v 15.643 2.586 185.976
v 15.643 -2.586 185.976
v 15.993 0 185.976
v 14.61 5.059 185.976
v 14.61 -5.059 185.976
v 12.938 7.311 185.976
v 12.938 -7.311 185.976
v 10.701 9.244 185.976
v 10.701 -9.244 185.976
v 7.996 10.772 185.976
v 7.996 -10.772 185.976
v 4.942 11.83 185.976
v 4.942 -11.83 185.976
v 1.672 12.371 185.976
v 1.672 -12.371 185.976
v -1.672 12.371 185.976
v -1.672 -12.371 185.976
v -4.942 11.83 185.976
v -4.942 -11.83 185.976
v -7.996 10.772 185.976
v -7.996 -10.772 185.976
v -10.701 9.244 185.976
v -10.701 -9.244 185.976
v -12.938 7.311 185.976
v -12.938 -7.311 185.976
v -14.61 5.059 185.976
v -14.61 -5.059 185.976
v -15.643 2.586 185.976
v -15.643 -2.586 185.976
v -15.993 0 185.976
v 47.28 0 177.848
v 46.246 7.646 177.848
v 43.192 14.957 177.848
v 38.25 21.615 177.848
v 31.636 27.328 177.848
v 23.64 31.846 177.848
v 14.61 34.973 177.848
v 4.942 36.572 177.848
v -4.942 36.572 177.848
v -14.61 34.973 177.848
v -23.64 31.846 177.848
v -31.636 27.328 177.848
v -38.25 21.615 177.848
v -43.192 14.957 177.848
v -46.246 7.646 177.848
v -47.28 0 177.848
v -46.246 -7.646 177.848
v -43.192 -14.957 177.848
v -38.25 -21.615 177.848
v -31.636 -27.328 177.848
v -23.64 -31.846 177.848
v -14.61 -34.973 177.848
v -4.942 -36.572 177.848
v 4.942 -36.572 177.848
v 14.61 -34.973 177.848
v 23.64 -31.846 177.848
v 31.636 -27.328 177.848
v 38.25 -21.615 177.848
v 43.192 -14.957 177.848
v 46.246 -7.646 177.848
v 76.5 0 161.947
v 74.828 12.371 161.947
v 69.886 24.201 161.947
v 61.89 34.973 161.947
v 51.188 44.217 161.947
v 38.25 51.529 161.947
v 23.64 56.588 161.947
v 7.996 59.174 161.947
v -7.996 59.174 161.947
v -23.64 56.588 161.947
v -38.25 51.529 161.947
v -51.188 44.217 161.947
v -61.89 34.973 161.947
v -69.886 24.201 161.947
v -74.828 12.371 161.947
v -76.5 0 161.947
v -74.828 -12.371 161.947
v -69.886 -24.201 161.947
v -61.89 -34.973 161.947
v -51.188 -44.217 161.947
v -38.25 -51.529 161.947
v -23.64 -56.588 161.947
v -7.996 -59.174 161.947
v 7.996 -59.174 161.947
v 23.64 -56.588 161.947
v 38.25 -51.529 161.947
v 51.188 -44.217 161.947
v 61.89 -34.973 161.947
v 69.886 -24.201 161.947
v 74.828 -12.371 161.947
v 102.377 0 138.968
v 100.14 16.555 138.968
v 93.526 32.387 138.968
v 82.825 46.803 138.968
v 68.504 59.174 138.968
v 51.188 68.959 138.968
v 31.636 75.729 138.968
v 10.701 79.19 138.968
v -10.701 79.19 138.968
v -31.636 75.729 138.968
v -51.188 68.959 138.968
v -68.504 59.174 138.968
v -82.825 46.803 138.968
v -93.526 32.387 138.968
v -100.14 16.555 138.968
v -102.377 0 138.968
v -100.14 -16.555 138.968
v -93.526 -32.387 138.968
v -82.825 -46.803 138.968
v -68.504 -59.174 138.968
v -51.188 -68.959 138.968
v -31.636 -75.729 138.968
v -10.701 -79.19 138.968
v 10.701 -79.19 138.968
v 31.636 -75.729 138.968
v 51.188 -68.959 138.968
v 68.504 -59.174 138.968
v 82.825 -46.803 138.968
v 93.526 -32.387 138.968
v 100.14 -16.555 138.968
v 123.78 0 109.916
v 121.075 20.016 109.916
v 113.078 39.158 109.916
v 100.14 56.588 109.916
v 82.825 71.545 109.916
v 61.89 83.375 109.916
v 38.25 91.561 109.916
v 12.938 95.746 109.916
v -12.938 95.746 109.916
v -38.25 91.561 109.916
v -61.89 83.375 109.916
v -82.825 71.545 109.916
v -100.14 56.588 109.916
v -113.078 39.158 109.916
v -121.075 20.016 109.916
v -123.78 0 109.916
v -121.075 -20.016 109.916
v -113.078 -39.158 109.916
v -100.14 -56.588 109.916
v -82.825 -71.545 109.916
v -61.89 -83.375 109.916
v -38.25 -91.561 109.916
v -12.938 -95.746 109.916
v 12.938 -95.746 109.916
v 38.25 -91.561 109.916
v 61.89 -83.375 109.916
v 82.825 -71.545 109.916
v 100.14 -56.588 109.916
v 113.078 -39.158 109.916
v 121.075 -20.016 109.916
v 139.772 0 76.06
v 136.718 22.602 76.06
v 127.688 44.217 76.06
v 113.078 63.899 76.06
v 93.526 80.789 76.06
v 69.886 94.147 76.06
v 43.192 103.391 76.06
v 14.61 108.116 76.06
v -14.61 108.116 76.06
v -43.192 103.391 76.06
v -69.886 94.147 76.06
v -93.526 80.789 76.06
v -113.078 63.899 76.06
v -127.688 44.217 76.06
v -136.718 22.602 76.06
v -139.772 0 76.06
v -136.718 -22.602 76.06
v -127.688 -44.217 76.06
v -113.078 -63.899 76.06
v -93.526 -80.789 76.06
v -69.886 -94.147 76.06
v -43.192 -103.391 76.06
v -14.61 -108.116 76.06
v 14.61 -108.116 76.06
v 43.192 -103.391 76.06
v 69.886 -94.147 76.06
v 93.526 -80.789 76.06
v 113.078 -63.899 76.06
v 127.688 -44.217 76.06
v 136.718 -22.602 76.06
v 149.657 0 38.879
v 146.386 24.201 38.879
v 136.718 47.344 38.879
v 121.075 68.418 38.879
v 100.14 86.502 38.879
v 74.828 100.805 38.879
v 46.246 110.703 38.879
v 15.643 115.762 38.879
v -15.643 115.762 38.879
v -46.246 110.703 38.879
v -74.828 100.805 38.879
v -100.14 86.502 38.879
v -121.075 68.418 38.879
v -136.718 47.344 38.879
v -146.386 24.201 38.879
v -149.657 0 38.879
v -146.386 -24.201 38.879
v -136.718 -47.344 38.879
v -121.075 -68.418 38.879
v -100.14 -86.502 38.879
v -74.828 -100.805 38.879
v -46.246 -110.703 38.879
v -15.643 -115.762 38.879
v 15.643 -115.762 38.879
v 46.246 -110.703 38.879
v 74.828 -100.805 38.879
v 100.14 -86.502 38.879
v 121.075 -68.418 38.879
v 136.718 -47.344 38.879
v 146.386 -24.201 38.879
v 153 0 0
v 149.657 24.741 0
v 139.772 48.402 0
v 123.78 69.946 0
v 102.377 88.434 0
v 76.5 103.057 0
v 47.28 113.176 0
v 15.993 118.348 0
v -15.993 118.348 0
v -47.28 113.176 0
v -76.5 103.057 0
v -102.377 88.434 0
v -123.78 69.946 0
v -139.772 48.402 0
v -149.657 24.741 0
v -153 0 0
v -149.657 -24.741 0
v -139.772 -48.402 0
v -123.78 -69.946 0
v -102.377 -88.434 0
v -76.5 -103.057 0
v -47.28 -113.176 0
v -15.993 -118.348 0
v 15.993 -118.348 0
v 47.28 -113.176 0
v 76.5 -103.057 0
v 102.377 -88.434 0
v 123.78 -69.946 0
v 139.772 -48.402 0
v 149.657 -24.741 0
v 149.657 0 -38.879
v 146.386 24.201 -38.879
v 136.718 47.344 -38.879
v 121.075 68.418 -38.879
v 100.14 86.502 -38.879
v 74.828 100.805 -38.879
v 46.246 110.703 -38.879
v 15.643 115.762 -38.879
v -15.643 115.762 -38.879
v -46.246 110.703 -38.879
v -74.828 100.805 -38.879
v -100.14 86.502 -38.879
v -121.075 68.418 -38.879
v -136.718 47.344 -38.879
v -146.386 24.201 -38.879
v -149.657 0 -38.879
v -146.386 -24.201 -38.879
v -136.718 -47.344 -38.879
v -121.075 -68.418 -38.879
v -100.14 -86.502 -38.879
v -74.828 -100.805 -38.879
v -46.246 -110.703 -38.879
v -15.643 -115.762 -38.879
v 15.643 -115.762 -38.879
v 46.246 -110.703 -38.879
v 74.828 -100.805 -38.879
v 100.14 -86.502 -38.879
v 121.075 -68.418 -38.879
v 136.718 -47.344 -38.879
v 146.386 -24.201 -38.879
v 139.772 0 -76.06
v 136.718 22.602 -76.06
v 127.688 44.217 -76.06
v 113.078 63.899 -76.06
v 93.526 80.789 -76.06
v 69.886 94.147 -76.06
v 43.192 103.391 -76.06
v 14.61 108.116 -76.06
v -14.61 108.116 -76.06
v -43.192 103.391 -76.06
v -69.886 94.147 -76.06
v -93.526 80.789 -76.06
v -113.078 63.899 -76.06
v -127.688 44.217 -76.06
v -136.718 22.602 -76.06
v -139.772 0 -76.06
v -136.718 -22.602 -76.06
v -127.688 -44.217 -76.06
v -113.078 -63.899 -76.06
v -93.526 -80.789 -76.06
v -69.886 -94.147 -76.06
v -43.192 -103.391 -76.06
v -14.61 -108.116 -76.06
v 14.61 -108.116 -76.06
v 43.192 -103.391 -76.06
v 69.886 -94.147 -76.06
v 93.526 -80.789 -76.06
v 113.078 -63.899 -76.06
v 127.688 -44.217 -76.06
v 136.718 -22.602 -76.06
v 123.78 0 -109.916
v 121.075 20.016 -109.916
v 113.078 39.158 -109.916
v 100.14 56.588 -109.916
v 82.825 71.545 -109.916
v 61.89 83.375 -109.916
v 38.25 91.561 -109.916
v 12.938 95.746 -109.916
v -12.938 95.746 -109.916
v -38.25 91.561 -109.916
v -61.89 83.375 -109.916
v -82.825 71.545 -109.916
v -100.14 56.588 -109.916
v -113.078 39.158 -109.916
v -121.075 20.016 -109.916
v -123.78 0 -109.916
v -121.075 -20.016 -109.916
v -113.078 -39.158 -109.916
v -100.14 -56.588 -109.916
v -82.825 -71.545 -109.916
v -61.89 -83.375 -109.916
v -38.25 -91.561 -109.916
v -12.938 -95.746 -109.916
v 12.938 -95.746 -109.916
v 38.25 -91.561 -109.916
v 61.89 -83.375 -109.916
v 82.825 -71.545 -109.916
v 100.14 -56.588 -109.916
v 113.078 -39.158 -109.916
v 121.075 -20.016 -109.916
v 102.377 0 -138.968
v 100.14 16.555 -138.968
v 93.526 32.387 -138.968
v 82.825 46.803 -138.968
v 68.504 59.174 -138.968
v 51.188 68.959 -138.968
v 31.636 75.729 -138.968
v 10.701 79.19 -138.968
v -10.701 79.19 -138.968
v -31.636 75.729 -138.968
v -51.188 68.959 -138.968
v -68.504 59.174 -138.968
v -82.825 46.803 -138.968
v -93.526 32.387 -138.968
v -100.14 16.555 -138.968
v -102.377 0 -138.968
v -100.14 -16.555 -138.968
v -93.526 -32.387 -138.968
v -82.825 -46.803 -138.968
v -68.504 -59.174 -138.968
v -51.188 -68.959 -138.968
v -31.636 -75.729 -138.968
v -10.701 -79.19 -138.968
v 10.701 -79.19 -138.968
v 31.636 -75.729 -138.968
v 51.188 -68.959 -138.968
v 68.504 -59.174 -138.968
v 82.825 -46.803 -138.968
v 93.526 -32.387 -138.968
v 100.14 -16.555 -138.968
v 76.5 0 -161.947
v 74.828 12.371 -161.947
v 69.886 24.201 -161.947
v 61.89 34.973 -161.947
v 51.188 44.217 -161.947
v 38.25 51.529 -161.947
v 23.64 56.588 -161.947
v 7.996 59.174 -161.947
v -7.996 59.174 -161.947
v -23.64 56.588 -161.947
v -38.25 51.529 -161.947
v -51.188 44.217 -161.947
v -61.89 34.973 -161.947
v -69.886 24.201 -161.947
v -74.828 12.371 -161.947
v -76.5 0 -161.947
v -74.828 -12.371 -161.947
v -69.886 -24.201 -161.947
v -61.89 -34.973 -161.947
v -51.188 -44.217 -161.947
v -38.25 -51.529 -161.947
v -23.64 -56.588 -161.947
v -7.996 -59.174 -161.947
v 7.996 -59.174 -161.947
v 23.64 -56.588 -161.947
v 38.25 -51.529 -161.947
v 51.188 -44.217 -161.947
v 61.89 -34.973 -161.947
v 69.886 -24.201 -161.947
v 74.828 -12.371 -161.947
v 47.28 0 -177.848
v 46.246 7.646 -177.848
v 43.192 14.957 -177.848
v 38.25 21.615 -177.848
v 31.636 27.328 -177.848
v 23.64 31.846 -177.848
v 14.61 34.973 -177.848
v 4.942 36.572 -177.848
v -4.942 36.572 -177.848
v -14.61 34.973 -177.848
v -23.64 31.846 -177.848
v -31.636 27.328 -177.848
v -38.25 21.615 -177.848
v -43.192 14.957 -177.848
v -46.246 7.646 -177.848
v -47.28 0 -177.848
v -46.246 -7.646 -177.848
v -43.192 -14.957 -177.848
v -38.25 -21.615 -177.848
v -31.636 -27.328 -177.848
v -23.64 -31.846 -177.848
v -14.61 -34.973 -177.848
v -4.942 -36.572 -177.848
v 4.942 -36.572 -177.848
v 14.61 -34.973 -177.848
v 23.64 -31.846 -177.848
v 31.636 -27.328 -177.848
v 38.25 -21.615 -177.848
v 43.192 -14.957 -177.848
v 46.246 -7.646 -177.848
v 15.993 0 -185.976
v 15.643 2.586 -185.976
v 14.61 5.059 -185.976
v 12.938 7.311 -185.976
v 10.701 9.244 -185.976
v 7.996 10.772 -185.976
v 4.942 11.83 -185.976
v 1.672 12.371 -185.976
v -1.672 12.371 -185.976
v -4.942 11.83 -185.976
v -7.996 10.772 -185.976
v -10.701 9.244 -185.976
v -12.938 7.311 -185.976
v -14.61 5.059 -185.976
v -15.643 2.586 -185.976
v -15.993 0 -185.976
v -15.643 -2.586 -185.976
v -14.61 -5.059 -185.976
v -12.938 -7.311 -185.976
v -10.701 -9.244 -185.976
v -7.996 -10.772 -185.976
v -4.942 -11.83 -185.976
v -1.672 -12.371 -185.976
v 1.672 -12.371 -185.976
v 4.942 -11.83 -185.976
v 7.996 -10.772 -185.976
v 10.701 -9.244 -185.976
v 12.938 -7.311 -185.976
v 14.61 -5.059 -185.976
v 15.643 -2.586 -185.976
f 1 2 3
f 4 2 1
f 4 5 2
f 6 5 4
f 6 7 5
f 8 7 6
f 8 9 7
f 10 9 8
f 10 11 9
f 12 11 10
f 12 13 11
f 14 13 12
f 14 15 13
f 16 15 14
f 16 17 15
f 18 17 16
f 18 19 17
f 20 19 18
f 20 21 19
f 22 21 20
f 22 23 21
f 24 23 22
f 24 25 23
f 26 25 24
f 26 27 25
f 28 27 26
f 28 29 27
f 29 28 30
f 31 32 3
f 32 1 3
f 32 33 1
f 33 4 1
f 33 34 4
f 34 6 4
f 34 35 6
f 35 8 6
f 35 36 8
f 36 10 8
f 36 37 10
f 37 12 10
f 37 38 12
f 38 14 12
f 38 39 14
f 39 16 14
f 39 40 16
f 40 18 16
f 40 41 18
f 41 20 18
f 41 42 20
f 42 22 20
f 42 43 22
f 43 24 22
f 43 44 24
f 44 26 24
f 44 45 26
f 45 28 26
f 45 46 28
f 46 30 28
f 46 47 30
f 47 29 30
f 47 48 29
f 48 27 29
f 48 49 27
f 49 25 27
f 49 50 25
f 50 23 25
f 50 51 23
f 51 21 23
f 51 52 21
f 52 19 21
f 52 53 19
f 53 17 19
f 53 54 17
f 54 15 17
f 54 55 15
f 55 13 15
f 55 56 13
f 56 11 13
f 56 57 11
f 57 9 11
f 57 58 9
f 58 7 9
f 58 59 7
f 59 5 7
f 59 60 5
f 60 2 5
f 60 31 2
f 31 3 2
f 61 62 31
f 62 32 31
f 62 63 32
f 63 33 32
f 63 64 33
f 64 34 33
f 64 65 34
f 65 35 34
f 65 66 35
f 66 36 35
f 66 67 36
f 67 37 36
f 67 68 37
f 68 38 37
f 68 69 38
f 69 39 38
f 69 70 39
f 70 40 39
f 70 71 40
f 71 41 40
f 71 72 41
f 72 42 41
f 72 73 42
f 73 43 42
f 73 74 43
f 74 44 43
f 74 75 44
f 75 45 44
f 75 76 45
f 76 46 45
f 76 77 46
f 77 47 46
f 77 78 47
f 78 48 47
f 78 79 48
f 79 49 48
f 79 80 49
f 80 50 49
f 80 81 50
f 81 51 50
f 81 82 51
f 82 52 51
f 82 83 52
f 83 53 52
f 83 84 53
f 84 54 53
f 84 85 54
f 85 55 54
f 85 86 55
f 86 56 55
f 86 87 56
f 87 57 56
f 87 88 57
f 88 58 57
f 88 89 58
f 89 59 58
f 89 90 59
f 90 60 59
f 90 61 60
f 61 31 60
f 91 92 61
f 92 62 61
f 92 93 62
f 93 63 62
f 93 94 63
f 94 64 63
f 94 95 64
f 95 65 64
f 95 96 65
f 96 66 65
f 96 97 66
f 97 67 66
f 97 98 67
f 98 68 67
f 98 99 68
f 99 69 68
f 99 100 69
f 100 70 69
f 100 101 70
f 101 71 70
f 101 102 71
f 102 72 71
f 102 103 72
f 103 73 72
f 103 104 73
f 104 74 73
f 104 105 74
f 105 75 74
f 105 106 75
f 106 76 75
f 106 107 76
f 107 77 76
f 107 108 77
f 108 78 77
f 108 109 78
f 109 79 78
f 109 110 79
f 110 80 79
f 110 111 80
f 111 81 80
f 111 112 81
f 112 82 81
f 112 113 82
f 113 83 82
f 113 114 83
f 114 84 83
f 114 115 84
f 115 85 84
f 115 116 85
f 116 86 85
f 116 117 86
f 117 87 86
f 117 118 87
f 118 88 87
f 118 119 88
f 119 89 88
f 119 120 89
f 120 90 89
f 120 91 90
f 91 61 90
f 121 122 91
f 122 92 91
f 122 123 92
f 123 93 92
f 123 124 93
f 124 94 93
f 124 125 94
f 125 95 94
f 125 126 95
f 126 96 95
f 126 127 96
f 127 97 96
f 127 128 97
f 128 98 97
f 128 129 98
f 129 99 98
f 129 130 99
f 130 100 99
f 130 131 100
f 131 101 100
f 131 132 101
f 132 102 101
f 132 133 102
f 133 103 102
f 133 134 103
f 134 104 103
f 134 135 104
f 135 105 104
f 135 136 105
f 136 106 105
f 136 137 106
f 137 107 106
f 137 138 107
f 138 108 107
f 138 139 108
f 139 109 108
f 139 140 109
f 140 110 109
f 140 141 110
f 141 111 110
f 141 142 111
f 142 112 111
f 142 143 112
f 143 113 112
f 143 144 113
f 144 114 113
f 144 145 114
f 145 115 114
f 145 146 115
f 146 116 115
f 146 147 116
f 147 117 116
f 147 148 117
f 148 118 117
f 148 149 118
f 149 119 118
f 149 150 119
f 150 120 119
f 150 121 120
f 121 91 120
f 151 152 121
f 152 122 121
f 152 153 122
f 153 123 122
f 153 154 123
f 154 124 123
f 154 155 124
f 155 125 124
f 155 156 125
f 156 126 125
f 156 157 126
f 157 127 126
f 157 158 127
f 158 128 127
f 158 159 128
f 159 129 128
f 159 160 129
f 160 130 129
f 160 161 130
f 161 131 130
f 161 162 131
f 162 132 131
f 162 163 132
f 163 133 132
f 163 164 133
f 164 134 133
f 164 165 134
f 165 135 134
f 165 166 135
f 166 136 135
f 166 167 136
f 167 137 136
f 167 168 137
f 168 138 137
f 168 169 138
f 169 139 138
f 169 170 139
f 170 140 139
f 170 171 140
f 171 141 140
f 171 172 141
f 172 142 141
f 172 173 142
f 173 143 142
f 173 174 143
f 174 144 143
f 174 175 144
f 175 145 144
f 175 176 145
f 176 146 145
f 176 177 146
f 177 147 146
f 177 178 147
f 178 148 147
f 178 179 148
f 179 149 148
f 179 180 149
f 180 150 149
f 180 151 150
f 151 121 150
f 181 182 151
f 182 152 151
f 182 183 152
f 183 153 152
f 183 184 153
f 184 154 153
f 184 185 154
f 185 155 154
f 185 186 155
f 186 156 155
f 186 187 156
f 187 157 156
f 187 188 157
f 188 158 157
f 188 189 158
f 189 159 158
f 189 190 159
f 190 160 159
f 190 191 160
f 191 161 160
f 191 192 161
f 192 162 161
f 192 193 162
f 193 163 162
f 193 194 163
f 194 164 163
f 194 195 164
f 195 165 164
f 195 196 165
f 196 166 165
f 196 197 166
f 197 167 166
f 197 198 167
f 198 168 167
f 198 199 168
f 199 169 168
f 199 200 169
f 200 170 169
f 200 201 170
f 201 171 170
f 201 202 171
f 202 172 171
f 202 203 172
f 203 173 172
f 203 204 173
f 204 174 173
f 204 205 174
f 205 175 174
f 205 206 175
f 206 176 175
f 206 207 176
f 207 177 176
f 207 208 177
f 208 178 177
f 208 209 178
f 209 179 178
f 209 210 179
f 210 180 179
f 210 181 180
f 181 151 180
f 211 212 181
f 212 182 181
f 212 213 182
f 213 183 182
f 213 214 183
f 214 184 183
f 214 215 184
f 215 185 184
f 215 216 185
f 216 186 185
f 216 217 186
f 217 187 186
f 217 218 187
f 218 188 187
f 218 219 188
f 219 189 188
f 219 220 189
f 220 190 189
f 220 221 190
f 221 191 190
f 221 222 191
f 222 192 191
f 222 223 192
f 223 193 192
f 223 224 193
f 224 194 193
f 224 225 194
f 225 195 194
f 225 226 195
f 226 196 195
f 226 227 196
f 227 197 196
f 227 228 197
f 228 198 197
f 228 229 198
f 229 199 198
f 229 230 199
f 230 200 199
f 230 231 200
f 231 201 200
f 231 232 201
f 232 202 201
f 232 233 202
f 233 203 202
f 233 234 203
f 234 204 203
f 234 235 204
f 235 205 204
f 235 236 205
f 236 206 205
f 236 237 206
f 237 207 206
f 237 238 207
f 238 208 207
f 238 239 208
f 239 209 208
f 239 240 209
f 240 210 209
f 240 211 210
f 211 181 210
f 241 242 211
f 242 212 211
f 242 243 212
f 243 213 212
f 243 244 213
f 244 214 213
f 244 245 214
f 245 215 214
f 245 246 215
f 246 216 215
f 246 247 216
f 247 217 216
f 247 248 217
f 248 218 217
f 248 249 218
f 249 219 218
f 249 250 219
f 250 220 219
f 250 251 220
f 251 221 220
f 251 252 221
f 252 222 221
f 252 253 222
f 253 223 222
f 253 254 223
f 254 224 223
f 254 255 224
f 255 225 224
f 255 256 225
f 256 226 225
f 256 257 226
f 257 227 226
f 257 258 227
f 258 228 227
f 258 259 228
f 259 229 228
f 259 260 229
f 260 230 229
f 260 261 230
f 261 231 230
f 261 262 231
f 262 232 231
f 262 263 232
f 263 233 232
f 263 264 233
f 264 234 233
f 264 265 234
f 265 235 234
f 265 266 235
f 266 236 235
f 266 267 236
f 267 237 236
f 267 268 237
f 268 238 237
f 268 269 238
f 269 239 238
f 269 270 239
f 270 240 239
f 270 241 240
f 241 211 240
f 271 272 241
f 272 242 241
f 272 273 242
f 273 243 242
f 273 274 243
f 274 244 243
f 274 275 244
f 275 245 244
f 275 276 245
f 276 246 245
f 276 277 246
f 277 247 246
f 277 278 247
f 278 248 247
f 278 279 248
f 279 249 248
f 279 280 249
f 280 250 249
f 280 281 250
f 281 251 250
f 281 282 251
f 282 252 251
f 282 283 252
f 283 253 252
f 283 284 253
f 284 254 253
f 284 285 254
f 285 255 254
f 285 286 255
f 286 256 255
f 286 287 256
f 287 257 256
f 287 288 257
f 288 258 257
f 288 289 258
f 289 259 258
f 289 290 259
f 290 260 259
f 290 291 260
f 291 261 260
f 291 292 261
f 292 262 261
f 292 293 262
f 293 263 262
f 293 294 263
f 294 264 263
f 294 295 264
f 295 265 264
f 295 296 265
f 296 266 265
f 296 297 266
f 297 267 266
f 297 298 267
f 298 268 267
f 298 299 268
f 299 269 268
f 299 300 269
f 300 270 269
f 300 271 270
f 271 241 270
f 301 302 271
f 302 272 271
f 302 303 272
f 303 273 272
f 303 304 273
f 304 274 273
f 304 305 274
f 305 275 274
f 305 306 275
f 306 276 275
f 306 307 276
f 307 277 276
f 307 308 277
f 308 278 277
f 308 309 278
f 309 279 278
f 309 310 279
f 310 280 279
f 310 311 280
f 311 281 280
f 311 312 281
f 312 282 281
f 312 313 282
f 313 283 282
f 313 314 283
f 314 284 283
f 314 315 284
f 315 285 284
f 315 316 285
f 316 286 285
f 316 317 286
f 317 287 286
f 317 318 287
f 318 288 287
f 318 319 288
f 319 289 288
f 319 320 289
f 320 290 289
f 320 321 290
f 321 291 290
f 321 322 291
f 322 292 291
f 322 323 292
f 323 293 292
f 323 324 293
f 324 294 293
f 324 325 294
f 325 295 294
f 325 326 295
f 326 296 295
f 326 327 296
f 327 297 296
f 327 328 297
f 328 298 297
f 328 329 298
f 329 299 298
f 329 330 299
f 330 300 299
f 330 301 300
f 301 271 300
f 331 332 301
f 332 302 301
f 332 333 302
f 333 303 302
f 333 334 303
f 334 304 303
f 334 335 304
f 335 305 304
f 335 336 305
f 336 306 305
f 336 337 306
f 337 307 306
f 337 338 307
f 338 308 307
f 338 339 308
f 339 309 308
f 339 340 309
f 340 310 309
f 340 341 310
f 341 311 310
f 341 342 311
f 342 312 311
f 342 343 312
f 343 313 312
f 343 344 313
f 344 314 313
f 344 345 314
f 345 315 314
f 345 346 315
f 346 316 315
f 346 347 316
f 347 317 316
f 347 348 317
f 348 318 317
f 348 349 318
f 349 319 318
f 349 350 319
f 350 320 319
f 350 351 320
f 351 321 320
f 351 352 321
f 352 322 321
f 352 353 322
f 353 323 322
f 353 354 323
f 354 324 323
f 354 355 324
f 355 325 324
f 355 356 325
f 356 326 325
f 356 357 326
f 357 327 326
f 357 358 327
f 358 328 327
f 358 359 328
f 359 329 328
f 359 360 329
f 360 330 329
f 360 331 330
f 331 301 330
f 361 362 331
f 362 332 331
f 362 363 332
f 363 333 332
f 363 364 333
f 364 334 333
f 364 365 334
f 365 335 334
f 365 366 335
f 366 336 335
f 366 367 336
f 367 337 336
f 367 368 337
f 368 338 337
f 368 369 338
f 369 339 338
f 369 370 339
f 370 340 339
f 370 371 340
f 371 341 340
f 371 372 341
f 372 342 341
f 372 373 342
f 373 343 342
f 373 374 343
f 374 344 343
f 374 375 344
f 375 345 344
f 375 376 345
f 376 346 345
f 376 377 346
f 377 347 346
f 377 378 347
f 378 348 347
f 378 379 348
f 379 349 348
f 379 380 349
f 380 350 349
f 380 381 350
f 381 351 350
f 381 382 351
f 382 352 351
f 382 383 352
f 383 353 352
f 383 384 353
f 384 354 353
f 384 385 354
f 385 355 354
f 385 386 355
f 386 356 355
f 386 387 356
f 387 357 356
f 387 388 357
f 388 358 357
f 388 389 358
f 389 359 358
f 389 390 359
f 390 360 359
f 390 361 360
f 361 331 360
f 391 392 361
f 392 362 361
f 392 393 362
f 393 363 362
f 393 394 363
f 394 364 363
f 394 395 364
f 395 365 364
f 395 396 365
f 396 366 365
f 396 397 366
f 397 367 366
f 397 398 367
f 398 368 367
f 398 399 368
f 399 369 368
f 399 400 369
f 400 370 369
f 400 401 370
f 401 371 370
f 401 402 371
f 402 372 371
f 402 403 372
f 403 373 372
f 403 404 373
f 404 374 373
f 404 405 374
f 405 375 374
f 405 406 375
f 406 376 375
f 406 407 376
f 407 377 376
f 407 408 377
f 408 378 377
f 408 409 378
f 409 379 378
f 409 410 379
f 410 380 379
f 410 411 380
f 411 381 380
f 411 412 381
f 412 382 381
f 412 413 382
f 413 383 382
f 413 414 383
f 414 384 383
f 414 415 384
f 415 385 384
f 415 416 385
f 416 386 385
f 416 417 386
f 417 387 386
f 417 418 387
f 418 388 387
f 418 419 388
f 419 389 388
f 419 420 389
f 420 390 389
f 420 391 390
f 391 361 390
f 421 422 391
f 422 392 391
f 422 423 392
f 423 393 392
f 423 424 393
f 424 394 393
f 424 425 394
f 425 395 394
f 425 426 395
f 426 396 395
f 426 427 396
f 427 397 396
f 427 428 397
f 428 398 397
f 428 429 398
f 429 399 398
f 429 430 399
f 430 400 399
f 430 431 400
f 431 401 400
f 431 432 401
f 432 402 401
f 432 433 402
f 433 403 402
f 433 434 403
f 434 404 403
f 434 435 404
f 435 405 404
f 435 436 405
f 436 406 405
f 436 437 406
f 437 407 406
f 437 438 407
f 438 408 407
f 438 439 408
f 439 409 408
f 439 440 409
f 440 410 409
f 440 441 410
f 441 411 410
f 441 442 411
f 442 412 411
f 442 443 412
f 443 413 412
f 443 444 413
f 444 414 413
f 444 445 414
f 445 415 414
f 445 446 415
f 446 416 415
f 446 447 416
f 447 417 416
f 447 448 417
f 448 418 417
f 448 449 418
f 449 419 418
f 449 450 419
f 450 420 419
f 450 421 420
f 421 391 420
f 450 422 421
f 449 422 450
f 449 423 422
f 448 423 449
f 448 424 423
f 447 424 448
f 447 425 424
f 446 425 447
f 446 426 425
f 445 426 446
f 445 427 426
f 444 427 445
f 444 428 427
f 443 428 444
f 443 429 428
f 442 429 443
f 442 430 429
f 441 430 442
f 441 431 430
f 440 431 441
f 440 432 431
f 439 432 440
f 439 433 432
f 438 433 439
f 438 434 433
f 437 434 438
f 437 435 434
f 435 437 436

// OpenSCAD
// Generated by SolidPython 1.0.1 on 2020-07-29 00:46:48


scale(v = [9, 7, 11]) {
	sphere(r = 17);
}
/***********************************************
*********      SolidPython code:      **********
************************************************
 
# import packages: SolidPython
from solid import *
from solid.utils import *
from itertools import chain, combinations, permutations


class Resize:

    def __init__(self, scad_file):
        self.scad_file = scad_file
        #self.scad_file = import_scad(scad_file)
        # cone/cylinder param:
        self.r1 = 0
        self.r2 = 0
        self.h = 0
        # rectangular prism param:
        self.w = 0
        self.l = 0
        # ellipse param:
        self.r = 0

    # import OpenScad code (file name corresponds to shape)


    # classify shape + parameters
    def assign(self, param1, param2, param3):
        if self.scad_file == 'cone.scad':
            self.r1 = param1
            self.r2 = param2
            self.h = param3
        elif self.scad_file == 'cylinder.scad':
            self.r1 = param1
            self.r2 = param2
            self.h = param3
        elif self.scad_file == 'rectangularPrism.scad':
            self.h = param1
            self.l = param2
            self.w = param3
        else:
            self.r = param1
            self.h = param2

    # resize parameters
    def iterate(self):
        x = range(3, 20, 2)
        i = 1
        if self.scad_file == 'cone.scad':
            tempList = list(permutations(x, 2))
            for temp in tempList:
                param1 = temp[0]
                param2 = temp[1]
                filepath = 'produced_scad_files/' + 'cone' + str(param1) + '_' + str(param2) + '_' + '.scad'
                scad_render_to_file(cylinder(h=param1, r1=param2, r2=0), filepath)

        elif self.scad_file == 'cylinder.scad':
            tempList = list(permutations(x, 3))
            for temp in tempList:
                param1 = temp[0]
                param2 = temp[1]
                filepath = 'produced_scad_files/' + 'cylinder' + str(param1) + '_' + str(param2) + '_' + '.scad'
                scad_render_to_file(cylinder(h=param1, r1=param2, r2=param2), filepath)

        elif self.scad_file == 'rectangularPrism.scad':
            tempList = list(permutations(x, 3))
            for temp in tempList:
                param1 = temp[0]
                param2 = temp[1]
                param3 = temp[2]
                filepath = 'produced_scad_files/' + 'rectangularPrism' + str(param1) + '_' + str(param2) + '_' + str(
                    param3) + '.scad'
                scad_render_to_file(cube(size=(param1, param2, param3)), filepath)

        elif self.scad_file == 'ellipse.scad':
            tempList = list(permutations(x, 4))
            for temp in tempList:
                param1 = temp[0]
                param2 = temp[1]
                param3 = temp[2]
                param4 = temp[3]
                filepath = 'produced_scad_files/' + 'ellipse' + str(param1) + '_' + str(param2) + '_' + str(param3) + '_' + str(param4) + '.scad'
                scad_render_to_file(scale([param1, param2, param3])(sphere(r=param4)), filepath)

    def render_to_scadfile(self):
        scad_render_to_file(scad, 'example.scad') 
 
************************************************/
